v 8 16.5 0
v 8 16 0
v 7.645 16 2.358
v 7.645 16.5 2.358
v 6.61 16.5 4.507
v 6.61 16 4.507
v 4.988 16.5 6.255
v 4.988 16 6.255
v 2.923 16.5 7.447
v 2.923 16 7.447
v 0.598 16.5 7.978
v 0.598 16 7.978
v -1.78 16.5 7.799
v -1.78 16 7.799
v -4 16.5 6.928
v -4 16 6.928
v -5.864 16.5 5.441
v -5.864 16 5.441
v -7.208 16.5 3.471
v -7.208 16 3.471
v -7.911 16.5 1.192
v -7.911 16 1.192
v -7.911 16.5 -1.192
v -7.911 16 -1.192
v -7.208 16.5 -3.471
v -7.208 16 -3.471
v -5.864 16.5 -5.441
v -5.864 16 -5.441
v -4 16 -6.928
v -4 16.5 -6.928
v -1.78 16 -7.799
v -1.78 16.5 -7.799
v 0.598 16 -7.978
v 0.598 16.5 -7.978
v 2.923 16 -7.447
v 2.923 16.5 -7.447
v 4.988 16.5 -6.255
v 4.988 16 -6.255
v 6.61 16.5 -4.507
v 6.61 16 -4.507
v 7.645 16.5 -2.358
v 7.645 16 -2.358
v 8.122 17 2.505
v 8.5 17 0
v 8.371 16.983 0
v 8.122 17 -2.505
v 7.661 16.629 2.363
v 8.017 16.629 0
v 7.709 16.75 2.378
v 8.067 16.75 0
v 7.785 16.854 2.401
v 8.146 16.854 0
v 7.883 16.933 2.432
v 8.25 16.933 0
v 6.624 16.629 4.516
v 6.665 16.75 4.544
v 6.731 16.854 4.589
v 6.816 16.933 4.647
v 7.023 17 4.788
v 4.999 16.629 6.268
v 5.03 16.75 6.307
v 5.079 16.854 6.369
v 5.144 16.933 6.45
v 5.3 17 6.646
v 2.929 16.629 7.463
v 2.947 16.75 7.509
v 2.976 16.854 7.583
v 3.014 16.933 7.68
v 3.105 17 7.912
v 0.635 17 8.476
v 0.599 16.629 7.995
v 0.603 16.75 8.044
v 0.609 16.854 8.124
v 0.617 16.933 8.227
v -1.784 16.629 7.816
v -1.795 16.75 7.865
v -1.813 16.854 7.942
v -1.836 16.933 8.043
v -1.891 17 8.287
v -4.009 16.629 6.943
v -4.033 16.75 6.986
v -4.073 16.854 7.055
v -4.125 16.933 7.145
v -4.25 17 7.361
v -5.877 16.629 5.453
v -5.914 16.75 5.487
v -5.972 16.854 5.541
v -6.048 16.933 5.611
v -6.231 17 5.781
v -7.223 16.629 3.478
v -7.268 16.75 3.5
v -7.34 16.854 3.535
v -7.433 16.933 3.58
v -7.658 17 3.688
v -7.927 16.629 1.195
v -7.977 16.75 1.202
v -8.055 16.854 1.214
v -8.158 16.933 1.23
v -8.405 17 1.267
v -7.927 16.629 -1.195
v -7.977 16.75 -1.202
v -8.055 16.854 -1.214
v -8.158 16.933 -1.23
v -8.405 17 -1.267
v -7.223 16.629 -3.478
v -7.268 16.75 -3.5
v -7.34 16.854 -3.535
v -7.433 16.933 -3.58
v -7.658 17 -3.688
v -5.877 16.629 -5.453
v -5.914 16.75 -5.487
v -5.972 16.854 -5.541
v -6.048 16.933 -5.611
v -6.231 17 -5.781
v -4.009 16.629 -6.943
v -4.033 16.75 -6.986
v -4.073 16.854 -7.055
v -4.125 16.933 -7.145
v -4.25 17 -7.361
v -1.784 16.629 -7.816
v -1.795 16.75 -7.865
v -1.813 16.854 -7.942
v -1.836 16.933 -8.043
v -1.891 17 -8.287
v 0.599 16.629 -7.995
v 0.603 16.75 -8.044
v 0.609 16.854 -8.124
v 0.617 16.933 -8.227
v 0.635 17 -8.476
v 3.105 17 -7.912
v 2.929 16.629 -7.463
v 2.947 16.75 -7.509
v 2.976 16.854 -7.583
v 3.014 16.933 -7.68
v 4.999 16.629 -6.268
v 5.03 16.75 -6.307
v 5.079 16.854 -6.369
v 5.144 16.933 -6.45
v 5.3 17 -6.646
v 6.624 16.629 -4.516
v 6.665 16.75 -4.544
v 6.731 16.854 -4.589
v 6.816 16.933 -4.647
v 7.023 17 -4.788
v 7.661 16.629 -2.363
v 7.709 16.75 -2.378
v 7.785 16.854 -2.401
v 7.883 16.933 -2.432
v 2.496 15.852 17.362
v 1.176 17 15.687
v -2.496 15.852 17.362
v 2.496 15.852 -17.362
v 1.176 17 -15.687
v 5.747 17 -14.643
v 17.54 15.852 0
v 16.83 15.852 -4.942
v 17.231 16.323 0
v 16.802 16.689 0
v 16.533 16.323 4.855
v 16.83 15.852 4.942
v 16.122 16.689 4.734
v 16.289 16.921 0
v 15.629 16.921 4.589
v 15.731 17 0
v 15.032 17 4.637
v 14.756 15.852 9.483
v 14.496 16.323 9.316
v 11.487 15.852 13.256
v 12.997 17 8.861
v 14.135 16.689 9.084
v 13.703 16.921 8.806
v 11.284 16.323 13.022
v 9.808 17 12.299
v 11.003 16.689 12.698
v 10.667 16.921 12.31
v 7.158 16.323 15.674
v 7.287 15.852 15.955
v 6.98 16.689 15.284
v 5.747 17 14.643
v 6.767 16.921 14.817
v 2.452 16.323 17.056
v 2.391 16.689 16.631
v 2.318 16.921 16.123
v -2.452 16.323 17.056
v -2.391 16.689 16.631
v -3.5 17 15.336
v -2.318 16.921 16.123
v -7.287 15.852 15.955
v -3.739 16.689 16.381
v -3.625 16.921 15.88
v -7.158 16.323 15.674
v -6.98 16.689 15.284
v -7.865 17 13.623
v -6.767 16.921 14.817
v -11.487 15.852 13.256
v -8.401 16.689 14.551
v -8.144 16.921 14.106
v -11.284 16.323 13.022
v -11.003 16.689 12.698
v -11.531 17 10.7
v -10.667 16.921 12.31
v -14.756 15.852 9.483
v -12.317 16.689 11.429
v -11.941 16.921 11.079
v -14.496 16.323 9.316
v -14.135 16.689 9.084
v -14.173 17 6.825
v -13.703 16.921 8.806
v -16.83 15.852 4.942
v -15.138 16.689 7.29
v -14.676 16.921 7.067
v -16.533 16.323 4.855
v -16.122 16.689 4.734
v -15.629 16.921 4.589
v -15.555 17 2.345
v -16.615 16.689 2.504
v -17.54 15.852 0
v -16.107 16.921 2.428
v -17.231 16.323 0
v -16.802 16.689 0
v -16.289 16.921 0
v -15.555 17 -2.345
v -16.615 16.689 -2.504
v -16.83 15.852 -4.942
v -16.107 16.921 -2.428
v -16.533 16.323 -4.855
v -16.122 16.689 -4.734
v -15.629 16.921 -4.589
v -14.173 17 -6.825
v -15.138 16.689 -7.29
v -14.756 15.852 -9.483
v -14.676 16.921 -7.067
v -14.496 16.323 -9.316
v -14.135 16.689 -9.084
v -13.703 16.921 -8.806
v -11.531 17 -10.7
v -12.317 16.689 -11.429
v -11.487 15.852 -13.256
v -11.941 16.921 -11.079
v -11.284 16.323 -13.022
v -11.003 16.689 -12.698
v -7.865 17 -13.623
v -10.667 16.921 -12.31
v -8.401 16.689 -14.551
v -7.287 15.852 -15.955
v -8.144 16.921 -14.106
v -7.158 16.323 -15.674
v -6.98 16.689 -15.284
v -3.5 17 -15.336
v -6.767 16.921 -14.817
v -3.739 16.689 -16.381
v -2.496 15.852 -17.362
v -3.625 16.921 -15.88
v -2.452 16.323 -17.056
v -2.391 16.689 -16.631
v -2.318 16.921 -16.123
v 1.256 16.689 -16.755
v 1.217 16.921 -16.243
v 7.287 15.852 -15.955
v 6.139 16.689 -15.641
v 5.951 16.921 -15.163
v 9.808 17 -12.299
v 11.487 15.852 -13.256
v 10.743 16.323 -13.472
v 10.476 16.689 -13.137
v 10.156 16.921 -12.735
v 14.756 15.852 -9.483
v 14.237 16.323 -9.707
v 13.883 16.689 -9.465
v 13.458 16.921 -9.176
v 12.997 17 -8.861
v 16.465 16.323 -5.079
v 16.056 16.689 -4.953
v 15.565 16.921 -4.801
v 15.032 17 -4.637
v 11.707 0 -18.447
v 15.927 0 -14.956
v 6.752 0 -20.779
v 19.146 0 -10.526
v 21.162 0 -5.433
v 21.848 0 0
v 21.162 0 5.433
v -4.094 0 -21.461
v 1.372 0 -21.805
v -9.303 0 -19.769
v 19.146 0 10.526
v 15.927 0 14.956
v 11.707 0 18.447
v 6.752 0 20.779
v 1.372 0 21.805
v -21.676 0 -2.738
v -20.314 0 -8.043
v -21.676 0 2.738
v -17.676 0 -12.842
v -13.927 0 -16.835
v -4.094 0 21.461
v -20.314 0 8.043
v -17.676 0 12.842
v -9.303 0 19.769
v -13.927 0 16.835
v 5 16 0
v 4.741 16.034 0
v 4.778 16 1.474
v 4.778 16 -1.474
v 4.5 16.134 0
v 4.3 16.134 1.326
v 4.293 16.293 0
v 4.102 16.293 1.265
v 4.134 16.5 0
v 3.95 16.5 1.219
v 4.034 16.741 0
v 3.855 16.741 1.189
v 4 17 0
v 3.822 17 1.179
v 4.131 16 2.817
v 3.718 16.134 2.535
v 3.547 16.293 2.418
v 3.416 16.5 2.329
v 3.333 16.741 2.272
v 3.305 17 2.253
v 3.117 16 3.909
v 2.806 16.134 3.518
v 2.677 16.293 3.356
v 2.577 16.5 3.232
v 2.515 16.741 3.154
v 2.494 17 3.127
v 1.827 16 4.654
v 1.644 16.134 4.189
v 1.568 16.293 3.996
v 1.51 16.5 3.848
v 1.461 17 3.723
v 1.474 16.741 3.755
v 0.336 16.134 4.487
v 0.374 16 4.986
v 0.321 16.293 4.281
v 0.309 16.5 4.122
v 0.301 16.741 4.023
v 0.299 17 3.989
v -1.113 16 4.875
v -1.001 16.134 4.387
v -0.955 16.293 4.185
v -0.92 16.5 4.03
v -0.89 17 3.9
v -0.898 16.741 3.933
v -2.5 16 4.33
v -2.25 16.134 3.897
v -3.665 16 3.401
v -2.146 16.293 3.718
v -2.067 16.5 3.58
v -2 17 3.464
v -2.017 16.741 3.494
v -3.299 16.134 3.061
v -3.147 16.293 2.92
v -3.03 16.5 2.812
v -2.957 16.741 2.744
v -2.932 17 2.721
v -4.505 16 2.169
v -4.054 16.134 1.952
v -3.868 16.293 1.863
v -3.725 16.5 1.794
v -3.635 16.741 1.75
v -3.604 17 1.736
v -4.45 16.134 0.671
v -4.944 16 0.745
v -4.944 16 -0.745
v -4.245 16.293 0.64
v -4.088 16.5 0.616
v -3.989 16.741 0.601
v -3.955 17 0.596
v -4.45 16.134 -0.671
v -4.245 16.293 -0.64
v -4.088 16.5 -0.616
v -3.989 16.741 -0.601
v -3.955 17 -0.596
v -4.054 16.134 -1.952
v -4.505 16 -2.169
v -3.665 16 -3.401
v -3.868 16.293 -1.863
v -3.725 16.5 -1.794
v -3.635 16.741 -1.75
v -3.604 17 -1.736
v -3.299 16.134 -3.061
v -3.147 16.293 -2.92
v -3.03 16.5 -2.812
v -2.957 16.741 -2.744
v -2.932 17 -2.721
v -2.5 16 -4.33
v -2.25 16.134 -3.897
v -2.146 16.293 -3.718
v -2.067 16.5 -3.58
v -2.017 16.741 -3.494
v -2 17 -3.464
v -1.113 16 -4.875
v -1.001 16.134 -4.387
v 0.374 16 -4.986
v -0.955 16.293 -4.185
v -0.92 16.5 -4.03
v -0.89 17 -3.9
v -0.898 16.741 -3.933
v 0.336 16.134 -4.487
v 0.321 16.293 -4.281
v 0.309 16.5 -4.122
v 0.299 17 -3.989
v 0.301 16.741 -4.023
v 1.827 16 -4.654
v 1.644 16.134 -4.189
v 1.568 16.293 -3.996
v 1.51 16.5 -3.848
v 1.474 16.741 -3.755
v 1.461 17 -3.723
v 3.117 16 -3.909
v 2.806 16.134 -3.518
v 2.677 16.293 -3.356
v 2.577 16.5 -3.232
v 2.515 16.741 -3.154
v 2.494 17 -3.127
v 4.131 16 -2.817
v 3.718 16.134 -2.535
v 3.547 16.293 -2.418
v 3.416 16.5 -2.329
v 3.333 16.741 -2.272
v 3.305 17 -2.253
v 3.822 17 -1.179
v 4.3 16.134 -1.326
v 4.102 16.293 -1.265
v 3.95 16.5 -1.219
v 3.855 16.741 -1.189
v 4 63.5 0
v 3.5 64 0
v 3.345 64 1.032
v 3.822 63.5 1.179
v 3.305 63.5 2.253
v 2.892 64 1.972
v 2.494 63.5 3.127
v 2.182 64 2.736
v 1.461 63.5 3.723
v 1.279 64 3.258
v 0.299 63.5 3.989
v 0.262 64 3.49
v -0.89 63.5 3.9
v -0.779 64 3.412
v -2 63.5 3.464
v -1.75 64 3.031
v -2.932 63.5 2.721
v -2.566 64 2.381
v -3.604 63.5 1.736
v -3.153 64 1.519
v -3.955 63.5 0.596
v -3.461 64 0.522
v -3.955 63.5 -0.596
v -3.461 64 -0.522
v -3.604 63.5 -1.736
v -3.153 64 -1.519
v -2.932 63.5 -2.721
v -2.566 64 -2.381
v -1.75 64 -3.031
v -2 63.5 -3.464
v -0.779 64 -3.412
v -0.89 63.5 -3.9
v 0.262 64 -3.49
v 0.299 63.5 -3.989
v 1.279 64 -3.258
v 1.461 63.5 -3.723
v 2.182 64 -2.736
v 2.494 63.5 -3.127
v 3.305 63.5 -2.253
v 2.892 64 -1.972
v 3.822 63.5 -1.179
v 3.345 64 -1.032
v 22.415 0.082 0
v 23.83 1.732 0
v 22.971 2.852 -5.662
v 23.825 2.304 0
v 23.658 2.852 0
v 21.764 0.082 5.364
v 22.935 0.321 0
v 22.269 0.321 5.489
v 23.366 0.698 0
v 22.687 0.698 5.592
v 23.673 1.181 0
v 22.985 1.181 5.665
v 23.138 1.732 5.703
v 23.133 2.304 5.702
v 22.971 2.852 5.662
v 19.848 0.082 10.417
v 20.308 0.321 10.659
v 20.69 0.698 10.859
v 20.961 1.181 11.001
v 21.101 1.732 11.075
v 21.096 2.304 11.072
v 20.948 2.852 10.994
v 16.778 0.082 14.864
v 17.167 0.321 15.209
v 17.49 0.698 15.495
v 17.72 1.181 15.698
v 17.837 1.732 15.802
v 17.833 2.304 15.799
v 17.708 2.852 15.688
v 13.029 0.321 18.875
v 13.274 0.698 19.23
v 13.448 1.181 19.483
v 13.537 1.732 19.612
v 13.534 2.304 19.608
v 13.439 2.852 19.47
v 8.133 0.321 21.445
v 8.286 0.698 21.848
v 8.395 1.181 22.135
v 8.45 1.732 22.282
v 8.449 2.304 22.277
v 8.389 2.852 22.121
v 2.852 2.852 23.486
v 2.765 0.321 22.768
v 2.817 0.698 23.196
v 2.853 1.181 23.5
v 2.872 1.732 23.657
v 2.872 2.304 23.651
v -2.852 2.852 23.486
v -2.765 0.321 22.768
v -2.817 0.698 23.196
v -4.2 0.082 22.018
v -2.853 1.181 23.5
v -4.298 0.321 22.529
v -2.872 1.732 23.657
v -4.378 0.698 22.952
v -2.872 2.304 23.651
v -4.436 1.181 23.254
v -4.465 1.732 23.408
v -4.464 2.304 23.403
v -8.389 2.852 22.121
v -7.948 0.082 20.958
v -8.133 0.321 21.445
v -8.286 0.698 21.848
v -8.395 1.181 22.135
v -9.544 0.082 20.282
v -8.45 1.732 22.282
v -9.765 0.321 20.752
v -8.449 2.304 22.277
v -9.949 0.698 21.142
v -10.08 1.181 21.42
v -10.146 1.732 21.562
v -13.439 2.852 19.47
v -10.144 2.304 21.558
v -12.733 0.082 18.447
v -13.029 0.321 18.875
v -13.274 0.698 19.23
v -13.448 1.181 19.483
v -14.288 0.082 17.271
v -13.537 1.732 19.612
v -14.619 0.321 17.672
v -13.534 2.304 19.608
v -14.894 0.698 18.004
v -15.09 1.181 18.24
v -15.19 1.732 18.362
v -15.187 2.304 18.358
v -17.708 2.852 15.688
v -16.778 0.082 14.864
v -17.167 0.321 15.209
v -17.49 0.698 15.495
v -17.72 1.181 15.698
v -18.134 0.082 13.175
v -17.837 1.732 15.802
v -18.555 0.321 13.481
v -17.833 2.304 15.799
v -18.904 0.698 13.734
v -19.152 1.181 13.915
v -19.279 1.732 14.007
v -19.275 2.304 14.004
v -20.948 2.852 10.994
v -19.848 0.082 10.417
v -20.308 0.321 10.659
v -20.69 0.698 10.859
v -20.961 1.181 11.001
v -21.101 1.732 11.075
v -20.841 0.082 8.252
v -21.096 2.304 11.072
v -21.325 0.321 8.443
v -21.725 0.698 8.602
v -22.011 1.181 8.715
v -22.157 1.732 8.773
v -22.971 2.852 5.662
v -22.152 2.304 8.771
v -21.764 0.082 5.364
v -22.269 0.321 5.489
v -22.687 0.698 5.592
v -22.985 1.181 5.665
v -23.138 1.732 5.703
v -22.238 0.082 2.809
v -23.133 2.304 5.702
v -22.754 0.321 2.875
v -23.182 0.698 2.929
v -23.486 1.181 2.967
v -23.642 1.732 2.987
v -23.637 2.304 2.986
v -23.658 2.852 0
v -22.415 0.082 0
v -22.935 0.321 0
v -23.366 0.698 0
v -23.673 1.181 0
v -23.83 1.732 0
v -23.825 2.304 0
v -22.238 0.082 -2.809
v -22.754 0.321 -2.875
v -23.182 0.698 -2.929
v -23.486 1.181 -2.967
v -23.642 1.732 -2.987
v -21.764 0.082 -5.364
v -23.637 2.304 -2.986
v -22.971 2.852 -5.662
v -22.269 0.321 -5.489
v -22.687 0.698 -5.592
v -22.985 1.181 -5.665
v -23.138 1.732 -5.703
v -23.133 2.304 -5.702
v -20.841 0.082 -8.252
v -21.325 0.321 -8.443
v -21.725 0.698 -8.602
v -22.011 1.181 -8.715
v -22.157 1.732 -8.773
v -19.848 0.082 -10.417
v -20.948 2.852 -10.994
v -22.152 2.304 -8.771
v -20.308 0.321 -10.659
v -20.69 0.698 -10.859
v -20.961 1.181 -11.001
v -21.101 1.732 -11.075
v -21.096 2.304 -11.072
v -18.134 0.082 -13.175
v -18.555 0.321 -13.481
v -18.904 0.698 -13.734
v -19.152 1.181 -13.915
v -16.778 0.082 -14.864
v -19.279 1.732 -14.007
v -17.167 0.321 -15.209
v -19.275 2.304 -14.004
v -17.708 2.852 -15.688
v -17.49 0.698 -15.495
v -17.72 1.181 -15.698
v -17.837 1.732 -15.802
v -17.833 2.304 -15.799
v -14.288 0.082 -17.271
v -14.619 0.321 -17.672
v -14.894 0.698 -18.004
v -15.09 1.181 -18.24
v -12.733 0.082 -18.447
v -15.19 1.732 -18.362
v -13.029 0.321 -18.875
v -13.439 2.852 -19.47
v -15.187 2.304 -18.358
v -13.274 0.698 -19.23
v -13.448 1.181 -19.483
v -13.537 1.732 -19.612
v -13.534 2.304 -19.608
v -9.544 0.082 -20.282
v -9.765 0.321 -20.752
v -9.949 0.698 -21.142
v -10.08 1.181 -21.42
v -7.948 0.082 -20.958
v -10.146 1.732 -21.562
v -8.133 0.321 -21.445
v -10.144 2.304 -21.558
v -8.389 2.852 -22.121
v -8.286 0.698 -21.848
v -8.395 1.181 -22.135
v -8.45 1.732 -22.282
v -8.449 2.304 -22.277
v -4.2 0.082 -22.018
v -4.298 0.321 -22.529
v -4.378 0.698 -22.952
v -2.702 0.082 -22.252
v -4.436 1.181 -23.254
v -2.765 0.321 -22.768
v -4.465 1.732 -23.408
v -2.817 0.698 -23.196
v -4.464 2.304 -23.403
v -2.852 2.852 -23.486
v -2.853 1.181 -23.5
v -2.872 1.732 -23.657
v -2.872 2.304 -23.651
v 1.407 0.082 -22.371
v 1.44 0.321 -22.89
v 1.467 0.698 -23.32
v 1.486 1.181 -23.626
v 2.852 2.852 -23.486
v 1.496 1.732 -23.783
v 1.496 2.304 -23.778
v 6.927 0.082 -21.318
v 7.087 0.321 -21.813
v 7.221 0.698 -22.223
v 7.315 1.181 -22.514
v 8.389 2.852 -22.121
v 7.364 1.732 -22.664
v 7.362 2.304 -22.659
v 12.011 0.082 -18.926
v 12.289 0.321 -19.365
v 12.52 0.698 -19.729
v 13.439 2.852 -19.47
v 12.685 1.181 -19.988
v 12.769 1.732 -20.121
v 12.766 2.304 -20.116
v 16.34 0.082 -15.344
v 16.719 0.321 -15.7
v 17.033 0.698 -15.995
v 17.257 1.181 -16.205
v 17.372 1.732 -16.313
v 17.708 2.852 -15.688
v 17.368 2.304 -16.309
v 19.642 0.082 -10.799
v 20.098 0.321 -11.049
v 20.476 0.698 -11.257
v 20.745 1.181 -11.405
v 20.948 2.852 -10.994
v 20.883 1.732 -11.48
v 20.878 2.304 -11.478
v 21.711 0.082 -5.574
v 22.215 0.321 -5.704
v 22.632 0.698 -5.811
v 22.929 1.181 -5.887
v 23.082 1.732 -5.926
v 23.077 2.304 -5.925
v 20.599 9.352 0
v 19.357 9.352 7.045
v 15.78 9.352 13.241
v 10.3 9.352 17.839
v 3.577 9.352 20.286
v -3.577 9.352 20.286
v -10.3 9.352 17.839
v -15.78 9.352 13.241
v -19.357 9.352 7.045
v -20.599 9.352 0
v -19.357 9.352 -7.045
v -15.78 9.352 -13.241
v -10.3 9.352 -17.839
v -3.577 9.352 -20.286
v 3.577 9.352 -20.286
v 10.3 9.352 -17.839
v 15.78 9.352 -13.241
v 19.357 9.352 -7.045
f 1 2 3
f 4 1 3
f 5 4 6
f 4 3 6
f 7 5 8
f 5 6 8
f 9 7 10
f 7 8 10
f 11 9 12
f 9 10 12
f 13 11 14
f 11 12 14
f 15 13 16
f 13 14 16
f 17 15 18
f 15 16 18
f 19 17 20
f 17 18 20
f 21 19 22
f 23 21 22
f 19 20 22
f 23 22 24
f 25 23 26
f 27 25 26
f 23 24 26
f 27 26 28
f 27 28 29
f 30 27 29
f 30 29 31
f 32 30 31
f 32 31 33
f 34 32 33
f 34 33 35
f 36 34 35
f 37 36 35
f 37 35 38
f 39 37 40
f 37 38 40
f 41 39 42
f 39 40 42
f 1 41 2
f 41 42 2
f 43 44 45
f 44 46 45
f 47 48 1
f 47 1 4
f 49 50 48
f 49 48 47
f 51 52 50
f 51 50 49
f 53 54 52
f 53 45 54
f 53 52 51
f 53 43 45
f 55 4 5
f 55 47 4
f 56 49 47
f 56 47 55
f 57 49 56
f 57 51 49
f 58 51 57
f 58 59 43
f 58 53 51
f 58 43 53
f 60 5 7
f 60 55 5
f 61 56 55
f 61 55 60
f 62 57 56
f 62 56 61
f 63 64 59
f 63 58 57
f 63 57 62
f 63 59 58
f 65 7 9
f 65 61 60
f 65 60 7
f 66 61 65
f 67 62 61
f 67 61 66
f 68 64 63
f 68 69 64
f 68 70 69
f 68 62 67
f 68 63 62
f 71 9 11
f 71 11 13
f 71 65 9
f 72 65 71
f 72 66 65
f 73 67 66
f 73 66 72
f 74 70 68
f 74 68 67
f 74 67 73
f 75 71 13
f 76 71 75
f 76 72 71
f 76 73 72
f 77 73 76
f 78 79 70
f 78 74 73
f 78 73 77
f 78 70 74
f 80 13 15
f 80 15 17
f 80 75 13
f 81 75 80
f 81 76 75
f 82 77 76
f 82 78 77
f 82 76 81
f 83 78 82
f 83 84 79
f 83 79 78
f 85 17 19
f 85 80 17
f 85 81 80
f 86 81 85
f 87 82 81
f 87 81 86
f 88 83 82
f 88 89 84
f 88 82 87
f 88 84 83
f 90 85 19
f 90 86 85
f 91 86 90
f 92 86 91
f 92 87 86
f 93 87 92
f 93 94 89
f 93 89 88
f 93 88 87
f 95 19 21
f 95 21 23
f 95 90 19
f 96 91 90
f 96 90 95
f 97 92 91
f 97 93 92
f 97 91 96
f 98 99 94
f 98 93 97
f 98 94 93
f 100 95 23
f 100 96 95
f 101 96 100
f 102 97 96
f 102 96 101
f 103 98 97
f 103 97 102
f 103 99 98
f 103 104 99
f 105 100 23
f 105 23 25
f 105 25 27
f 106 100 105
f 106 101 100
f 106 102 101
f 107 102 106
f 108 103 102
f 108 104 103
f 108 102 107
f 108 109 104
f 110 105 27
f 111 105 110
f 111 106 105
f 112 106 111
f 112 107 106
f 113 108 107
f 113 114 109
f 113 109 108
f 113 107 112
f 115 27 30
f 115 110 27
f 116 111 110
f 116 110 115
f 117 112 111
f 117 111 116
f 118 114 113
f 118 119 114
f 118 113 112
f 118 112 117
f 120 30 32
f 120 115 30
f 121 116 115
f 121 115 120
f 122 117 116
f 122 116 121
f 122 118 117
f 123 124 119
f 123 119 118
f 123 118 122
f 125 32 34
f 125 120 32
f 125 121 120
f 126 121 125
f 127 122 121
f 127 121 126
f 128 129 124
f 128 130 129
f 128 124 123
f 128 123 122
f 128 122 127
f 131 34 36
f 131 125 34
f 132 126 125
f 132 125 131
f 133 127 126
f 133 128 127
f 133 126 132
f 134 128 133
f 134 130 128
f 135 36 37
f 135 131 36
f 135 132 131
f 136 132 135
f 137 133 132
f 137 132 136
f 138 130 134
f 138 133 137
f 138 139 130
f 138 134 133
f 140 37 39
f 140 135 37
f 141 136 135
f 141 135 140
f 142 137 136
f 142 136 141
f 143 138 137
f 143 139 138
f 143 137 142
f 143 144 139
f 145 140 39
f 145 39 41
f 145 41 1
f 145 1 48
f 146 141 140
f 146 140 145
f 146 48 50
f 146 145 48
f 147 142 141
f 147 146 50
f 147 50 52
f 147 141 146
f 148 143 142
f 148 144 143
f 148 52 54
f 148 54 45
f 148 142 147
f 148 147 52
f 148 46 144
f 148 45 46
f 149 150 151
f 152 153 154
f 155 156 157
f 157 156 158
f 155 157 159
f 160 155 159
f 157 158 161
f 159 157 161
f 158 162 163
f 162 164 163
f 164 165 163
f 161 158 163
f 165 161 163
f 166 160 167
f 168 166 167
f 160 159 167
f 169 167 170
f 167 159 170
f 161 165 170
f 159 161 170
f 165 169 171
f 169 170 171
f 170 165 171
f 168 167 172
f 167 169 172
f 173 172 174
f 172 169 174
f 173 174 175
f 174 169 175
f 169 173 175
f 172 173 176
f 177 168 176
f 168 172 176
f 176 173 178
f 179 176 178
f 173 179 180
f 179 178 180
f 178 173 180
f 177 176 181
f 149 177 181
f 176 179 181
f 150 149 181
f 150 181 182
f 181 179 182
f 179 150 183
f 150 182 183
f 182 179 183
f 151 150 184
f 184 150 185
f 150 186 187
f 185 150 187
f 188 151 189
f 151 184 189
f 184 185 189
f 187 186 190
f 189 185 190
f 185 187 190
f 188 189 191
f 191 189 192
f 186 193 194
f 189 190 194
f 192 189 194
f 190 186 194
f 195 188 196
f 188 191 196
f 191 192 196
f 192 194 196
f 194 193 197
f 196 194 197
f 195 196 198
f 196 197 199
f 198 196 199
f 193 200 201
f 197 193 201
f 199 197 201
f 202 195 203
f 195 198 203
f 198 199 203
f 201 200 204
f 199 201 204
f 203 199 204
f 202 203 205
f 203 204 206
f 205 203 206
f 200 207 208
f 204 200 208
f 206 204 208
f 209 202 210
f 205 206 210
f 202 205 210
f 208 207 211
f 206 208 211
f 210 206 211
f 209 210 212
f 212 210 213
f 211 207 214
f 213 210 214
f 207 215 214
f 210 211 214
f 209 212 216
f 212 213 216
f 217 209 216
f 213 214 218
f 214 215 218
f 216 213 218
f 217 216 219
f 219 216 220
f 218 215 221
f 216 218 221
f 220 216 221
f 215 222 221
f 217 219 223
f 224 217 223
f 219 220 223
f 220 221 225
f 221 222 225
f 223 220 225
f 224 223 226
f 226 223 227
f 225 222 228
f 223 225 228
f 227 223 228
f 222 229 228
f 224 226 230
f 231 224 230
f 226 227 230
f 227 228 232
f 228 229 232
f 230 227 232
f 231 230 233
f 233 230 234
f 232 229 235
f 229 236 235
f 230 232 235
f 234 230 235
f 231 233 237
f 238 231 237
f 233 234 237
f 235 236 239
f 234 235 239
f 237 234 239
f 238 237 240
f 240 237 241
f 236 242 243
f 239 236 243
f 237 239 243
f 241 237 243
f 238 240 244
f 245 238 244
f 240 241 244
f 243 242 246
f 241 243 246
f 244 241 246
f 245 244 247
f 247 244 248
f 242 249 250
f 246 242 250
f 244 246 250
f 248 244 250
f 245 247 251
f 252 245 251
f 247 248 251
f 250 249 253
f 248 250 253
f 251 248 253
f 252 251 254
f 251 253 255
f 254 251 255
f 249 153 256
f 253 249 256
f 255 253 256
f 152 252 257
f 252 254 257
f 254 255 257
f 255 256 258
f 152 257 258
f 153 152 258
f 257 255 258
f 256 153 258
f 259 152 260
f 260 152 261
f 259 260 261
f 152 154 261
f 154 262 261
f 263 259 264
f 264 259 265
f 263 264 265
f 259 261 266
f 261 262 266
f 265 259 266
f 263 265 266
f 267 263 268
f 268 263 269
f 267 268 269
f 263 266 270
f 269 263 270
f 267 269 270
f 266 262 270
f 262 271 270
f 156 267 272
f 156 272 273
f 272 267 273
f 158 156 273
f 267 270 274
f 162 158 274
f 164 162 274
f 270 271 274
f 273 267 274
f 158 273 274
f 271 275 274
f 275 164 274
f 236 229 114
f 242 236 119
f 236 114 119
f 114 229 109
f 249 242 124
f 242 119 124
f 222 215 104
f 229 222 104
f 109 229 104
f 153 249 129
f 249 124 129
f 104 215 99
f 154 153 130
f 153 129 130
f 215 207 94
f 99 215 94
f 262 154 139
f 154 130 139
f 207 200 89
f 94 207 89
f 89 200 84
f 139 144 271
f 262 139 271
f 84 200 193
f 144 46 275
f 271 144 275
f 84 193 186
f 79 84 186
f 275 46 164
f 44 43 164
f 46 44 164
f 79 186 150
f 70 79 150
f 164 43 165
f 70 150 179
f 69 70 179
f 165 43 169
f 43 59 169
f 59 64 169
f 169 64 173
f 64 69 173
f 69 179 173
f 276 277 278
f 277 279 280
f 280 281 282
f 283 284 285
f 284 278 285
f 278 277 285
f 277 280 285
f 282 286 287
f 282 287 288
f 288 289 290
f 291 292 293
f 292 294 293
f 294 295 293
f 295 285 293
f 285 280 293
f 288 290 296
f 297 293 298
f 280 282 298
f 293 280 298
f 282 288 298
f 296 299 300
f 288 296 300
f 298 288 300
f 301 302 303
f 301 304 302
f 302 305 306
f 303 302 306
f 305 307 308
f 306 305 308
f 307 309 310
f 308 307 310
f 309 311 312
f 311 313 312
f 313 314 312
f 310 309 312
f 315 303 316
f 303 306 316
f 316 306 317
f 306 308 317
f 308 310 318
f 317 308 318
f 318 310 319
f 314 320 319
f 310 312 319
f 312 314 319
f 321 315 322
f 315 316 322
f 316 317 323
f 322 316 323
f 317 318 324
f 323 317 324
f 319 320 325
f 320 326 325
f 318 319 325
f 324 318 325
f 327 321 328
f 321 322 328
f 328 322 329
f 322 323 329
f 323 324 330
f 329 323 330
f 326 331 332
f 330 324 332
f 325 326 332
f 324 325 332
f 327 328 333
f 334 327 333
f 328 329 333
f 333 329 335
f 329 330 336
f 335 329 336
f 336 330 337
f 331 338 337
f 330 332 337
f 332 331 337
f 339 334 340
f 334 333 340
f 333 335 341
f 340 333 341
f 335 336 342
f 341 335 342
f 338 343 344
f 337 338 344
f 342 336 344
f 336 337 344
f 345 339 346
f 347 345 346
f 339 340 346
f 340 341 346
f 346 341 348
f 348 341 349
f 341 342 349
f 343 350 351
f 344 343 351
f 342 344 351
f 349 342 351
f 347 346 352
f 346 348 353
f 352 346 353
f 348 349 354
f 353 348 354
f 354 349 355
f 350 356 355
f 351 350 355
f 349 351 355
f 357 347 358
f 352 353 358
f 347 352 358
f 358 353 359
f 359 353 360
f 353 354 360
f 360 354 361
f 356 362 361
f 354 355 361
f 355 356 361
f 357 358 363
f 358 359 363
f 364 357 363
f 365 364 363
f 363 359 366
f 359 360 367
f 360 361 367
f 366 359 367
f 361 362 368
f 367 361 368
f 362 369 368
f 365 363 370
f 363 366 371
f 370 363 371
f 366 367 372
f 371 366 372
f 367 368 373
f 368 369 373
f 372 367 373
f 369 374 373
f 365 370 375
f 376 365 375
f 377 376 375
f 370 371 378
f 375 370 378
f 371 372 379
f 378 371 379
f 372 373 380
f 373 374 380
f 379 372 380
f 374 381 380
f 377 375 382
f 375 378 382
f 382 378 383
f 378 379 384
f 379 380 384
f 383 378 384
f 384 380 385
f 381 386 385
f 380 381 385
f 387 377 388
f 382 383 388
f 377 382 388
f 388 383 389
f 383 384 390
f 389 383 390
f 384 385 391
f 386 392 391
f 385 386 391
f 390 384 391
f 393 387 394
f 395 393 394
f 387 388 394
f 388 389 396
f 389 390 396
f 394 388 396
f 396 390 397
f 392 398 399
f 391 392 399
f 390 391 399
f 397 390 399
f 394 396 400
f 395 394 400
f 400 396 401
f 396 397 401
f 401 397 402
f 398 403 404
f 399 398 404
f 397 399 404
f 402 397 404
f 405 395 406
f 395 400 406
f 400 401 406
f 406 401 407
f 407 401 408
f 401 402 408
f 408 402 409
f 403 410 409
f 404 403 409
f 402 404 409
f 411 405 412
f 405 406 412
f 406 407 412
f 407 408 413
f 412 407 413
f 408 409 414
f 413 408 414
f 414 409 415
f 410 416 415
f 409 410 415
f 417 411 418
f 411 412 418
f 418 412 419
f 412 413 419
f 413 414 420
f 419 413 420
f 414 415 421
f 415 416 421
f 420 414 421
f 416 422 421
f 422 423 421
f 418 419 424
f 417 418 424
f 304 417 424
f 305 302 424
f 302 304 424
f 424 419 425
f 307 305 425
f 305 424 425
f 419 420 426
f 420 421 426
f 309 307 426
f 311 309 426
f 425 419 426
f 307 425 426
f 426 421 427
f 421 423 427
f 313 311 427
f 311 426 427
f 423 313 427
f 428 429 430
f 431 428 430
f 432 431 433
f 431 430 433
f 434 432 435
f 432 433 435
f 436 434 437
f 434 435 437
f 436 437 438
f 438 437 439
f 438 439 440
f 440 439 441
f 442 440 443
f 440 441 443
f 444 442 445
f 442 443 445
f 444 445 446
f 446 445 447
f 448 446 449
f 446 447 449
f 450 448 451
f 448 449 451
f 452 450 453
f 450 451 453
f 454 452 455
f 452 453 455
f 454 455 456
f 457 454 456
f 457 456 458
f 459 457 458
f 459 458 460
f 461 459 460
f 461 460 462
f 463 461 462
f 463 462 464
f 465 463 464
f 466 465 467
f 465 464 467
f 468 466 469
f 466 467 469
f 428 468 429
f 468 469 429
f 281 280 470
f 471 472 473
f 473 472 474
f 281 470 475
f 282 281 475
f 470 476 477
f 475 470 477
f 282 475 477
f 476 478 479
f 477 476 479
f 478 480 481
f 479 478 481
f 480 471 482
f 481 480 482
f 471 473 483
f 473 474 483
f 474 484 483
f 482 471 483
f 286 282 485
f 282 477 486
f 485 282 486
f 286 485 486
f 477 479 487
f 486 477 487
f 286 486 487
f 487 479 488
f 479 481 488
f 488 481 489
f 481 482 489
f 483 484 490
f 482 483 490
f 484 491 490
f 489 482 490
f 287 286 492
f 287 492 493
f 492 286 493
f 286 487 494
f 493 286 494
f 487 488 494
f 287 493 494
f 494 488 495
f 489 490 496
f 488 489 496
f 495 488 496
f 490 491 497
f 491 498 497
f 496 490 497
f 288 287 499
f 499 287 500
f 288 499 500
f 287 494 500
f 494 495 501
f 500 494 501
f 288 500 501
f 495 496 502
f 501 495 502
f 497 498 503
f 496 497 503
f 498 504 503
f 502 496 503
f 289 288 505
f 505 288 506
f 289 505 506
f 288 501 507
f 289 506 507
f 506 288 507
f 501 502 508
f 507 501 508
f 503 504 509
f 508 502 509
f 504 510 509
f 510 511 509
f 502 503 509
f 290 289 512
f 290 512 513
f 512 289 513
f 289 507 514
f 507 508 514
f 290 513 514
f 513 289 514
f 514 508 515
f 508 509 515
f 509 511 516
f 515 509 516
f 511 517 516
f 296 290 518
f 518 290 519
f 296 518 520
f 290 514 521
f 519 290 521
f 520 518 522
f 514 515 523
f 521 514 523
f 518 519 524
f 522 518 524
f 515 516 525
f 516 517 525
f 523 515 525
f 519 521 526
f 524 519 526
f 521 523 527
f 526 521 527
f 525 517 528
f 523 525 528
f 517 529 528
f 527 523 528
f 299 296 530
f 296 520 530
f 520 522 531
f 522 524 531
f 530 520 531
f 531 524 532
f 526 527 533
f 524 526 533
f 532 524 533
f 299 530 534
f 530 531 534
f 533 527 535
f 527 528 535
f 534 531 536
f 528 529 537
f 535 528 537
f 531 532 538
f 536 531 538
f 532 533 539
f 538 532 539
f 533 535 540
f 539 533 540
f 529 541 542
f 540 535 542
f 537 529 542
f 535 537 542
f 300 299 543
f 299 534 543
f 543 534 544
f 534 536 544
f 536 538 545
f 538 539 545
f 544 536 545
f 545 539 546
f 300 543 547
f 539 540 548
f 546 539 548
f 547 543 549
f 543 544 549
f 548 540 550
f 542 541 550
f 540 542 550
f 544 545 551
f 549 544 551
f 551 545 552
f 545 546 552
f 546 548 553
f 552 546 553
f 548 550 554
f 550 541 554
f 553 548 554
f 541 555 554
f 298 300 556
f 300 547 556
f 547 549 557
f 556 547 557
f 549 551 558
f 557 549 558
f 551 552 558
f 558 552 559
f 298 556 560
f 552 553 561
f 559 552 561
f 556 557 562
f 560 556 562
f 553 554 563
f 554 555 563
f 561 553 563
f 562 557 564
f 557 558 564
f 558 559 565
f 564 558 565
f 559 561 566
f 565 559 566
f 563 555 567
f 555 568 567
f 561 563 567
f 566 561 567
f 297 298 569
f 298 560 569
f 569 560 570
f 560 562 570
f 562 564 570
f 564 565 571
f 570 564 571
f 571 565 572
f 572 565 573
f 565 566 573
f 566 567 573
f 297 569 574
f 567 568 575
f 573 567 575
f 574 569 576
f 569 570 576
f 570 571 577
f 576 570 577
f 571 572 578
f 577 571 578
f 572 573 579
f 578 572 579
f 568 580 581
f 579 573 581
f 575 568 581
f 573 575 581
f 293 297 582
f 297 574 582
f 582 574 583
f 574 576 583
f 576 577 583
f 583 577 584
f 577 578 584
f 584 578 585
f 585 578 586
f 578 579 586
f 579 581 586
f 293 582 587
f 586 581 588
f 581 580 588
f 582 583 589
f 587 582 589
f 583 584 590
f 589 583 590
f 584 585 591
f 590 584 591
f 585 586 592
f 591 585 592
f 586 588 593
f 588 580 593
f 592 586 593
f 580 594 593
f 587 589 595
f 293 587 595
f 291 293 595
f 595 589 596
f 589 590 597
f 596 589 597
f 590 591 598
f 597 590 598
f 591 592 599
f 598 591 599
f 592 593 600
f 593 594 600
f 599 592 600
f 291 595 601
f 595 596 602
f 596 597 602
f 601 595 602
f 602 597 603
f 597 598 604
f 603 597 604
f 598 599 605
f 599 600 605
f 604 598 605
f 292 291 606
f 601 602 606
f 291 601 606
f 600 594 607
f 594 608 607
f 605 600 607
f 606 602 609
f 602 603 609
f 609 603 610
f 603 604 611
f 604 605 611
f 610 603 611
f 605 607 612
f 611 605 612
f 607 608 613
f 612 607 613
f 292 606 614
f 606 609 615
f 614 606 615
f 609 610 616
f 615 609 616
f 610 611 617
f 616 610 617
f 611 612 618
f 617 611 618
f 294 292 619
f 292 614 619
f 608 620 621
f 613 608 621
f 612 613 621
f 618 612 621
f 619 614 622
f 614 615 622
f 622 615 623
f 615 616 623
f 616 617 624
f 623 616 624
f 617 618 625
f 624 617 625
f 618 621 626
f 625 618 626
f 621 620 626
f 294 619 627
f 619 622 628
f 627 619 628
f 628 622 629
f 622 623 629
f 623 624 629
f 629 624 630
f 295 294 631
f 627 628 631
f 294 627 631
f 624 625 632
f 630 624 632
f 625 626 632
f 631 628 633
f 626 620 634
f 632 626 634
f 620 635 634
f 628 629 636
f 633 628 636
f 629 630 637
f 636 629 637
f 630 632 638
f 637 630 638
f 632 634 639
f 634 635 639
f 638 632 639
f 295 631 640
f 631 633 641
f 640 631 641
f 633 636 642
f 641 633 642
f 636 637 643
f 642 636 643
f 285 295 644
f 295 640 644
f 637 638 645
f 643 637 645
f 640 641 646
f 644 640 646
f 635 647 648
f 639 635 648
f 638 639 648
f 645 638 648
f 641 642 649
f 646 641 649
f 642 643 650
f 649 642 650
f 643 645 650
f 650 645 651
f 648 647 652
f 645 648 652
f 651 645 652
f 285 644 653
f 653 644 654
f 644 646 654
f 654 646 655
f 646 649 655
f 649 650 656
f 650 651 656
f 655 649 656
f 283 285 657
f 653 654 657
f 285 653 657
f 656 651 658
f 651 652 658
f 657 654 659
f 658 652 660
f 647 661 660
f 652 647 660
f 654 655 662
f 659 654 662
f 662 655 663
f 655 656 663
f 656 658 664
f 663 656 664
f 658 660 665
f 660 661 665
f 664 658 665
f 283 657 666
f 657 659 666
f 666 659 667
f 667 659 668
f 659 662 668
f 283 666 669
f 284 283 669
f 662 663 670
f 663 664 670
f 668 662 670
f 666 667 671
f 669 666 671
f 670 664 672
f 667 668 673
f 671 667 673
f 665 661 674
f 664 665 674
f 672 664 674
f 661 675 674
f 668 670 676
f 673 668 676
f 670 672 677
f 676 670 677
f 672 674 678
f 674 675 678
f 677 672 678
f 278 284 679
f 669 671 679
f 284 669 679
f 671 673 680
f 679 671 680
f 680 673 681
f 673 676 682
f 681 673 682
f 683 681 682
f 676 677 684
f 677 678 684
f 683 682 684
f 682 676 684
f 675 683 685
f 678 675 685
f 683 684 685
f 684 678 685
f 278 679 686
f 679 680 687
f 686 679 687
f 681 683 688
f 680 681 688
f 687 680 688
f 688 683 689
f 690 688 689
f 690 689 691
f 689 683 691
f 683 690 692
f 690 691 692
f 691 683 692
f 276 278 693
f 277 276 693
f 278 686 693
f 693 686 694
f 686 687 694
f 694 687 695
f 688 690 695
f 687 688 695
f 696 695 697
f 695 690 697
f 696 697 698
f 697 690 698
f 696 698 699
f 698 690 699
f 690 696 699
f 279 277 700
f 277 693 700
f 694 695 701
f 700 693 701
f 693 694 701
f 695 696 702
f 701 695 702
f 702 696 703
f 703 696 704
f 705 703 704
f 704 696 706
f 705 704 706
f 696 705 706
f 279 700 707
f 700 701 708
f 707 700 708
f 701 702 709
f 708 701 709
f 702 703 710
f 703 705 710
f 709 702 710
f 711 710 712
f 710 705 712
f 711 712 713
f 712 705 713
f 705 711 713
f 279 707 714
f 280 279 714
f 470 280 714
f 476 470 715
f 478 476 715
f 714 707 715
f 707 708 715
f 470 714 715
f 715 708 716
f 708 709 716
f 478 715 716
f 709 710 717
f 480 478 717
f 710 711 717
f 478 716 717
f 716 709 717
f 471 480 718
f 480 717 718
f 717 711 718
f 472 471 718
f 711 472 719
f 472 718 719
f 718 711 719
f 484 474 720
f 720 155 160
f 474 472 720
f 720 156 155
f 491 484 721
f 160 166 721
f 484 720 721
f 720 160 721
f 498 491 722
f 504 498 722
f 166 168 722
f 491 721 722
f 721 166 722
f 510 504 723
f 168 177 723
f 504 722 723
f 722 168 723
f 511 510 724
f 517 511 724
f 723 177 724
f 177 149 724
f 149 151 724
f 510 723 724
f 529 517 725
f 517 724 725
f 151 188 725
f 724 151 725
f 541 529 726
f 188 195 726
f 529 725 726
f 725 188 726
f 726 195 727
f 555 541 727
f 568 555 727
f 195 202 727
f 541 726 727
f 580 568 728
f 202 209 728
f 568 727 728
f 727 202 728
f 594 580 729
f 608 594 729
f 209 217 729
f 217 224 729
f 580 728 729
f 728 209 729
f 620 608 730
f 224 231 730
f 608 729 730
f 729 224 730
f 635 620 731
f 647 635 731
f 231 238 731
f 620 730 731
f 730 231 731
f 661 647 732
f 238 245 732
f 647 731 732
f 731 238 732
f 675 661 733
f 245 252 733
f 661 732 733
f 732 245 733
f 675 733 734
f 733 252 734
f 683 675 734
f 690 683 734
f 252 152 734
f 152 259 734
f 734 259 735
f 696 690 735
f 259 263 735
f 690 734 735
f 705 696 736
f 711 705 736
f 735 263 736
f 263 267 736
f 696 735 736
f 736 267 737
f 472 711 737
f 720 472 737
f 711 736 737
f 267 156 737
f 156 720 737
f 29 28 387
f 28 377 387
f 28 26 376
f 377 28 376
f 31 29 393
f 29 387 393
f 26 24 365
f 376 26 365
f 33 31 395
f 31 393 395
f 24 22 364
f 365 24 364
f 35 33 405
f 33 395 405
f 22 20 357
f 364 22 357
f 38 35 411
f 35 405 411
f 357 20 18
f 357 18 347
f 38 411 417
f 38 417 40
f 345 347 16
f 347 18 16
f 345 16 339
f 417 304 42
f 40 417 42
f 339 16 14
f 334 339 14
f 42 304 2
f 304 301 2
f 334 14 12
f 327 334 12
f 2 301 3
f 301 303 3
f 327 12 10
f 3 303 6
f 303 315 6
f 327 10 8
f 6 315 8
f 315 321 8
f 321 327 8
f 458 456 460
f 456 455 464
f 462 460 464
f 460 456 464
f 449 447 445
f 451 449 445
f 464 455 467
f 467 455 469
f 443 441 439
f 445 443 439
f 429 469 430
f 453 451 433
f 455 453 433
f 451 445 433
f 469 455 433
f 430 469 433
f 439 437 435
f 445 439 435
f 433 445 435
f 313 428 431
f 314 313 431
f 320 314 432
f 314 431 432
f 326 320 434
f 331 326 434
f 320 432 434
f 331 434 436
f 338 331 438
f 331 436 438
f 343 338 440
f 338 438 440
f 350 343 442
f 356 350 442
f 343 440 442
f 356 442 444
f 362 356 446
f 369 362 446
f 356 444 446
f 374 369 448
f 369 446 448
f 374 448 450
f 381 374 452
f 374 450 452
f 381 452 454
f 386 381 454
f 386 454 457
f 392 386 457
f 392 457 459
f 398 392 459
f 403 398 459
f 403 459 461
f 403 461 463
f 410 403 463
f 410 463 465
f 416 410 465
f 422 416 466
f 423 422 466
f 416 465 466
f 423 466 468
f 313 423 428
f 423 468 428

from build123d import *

# Parameters (mm, degrees)
REDONDEO1_R   = 2
REDONDEO2_R   = 1
REDONDEO3_R   = 0.5
CHAFL_N1_SIZE = 0.5


with BuildPart() as part:
    # Croquis2 → Revolución1 (revolve)
    with BuildSketch(Plane.XY):
        Polygon((0, 0), (25, 0), (17, 17), (8, 17), (8, 16), (4, 16), (4, 64), (0, 64), align=None)
    revolve(axis=Axis((0, 64, 0), (0, -1, 0)))

    # Redondeo1
    redondeo1_edges = [part.edges().sort_by_distance(p)[0] for p in [
        (-17, 17, 0),
        (-25, 0, 0),
    ]]
    fillet(redondeo1_edges, radius=REDONDEO1_R)

    # Redondeo2
    redondeo2_edges = [part.edges().sort_by_distance(p)[0] for p in [
        (-4, 16, 0),
    ]]
    fillet(redondeo2_edges, radius=REDONDEO2_R)

    # Redondeo3
    redondeo3_edges = [part.edges().sort_by_distance(p)[0] for p in [
        (-8, 17, 0),
    ]]
    fillet(redondeo3_edges, radius=REDONDEO3_R)

    # Chaflán1
    chafl_n1_edges = [part.edges().sort_by_distance(p)[0] for p in [
        (-4, 64, 0),
    ]]
    chamfer(chafl_n1_edges, length=CHAFL_N1_SIZE)


solid = part.part
